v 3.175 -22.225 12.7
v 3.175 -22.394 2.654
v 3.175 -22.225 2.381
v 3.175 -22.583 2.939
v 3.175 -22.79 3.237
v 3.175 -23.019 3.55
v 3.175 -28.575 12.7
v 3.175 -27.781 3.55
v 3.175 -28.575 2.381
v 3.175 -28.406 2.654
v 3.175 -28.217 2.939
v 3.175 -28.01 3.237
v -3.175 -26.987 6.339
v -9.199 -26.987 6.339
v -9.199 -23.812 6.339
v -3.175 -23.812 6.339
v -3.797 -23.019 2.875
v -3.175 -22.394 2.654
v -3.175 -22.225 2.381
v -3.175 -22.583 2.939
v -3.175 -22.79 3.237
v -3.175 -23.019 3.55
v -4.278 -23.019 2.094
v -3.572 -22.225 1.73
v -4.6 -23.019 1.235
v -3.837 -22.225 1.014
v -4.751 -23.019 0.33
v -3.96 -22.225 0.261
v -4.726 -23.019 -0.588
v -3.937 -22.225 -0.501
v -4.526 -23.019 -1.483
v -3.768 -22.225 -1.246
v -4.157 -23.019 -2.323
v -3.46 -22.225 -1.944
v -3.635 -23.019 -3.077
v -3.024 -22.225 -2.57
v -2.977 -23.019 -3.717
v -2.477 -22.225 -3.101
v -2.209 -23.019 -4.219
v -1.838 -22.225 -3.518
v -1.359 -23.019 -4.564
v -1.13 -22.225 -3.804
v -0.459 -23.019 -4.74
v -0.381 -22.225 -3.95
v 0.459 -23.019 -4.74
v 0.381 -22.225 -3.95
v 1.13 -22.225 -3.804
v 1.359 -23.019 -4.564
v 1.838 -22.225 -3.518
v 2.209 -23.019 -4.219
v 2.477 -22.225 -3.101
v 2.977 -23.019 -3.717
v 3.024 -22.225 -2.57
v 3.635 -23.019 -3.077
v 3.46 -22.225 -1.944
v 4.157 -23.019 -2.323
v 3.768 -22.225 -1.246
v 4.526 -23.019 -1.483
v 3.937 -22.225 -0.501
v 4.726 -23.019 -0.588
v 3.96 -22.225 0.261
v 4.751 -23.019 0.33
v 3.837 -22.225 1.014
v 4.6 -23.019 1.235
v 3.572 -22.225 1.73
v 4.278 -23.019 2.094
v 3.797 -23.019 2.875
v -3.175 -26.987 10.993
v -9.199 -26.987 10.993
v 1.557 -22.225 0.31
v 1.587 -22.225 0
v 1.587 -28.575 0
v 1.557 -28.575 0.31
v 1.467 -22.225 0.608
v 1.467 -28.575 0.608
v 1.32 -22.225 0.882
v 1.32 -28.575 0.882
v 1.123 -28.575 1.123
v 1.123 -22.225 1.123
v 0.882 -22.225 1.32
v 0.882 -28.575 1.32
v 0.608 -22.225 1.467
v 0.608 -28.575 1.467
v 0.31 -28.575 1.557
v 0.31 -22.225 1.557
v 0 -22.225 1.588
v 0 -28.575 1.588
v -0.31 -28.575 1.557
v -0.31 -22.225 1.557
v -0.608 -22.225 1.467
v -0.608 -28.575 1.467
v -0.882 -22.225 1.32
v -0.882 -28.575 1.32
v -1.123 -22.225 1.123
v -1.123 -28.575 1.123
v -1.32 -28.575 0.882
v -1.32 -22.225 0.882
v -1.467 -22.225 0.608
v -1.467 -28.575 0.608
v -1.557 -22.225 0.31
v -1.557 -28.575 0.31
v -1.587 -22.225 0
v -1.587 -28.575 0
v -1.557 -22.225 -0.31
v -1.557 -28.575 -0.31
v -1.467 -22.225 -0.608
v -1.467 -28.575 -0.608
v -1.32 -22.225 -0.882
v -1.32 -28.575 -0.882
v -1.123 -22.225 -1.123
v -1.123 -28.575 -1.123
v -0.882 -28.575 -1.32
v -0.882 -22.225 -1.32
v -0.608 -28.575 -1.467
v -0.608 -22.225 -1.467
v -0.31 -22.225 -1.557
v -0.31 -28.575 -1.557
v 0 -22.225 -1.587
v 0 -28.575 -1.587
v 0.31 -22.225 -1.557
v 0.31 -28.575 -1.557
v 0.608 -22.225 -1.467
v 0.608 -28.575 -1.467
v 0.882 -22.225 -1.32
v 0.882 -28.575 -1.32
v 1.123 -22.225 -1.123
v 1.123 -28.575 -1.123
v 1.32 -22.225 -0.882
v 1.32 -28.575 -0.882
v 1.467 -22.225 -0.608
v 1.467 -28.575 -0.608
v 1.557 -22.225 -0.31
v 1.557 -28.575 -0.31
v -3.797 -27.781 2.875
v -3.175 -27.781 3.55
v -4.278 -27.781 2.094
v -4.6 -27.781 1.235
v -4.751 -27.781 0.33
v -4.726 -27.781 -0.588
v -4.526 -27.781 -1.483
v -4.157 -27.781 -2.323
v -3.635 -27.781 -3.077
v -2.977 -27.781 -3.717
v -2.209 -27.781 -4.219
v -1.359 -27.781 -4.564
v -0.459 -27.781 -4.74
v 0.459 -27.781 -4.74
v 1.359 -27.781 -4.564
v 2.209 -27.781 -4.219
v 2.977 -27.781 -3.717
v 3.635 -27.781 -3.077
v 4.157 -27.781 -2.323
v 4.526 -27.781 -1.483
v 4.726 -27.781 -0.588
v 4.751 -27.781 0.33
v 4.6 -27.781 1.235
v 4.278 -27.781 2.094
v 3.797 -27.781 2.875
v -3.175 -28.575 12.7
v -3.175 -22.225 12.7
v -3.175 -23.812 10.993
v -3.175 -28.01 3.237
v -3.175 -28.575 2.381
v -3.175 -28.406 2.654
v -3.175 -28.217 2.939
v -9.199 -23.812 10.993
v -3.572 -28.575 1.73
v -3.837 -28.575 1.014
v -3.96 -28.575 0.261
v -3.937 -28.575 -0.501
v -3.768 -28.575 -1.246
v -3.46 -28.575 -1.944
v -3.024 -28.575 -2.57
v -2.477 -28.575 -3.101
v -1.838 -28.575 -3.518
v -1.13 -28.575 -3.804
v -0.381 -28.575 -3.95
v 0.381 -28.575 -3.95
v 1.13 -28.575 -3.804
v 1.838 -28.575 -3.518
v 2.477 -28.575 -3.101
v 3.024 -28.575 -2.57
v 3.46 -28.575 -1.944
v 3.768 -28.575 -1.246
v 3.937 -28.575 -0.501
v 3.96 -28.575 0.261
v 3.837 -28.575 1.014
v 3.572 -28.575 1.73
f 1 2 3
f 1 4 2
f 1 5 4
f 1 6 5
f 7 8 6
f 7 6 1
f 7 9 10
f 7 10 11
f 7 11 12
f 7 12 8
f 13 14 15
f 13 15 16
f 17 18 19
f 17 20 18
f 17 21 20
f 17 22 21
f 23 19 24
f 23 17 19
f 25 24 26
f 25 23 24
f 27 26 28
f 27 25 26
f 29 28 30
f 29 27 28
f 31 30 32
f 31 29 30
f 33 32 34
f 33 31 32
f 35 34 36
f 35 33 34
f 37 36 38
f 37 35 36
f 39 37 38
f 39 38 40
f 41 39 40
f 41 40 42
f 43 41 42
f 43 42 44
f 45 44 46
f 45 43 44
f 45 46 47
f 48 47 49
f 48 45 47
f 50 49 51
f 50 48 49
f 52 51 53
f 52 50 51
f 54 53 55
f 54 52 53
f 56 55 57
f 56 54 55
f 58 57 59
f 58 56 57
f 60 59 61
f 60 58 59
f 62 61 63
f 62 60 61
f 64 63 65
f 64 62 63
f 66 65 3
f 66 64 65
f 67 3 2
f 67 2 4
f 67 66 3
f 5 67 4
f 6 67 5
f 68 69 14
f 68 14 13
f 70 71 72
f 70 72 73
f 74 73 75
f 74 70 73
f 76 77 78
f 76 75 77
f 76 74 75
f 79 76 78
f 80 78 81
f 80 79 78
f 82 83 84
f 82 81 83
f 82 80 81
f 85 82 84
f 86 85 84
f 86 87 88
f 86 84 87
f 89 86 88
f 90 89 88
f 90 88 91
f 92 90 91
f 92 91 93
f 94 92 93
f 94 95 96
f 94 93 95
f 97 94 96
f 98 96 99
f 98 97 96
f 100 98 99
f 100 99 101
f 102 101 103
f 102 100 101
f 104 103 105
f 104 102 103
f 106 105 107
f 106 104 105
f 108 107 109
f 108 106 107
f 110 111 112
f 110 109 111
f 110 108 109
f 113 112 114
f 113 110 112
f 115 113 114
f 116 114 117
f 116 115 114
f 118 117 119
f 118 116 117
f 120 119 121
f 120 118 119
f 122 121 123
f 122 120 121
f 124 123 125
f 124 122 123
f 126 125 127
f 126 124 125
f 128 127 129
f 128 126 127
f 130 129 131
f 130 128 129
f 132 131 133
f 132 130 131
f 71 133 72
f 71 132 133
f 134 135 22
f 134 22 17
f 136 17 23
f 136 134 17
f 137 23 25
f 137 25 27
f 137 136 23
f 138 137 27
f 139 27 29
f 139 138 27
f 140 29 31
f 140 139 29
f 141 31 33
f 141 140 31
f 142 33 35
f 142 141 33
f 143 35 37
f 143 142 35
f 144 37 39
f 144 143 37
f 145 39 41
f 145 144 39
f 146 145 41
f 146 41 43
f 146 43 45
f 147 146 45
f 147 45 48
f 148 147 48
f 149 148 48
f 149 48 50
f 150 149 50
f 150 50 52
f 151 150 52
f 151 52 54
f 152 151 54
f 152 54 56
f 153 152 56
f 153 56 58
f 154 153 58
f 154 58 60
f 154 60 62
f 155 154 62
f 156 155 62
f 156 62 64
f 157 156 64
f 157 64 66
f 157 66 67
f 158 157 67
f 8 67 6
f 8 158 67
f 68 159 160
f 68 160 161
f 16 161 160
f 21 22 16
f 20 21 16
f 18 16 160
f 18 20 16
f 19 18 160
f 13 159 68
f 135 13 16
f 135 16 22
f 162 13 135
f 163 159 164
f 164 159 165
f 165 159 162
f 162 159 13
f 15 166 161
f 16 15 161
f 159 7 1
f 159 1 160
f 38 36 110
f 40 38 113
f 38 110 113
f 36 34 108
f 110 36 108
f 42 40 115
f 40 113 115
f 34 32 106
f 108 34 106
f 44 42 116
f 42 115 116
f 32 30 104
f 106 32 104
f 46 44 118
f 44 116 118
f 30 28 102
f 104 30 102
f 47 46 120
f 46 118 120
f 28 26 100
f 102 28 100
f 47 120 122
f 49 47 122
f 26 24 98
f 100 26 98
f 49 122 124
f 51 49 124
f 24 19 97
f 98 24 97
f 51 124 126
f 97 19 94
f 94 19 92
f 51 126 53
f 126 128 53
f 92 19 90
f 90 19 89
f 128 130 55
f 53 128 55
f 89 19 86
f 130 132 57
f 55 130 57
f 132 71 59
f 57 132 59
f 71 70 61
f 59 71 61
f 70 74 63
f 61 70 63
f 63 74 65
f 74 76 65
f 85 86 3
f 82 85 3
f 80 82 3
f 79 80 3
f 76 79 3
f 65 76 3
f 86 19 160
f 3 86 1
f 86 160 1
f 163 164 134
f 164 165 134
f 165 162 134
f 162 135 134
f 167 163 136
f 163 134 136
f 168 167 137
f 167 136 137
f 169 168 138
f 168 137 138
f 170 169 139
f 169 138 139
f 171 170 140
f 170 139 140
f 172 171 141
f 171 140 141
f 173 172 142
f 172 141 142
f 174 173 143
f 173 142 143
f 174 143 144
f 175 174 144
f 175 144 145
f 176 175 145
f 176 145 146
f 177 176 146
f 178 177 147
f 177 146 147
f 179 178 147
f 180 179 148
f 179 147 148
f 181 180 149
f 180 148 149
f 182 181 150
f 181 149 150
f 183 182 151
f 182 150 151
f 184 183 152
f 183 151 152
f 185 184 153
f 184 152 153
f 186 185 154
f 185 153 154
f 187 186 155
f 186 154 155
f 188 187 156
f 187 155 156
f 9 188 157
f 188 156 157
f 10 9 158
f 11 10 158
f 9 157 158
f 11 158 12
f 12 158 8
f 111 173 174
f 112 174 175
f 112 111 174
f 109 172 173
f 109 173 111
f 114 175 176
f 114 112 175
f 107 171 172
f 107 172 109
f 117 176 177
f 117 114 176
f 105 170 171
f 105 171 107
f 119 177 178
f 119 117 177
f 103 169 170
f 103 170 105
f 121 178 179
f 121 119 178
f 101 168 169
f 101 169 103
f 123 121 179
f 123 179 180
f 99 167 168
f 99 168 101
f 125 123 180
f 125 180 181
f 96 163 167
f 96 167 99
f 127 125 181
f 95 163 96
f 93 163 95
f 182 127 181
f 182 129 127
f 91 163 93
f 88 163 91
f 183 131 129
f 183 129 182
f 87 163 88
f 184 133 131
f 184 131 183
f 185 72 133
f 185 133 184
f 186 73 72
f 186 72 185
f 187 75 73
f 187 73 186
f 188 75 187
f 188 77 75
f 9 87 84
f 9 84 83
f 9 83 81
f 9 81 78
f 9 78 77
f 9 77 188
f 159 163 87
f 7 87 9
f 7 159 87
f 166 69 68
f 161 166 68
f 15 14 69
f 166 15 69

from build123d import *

# Parameters (mm, degrees)
F2_R     = 4.7625
F2_R_2   = 1.5875
F5_DEPTH = 3.175
F6_DEPTH = 3.175
F4_W     = 7.239
F4_H     = 4.654424265
F7_DEPTH = 1.5875
F8_SIZE  = 0.79375


with BuildPart() as f5:
    # F2 (on offset) → F5 (new body, symmetric)
    with BuildSketch(Plane.XZ.offset(25.4)):
        Circle(F2_R)
        Circle(F2_R_2, mode=Mode.SUBTRACT)
    extrude(amount=F5_DEPTH, both=True)

    # F3 (on offset) → F6 (join, symmetric)
    with BuildSketch(Plane.XZ.offset(25.4)):
        with BuildLine():
            Line((3.175, 0), (3.175, 12.7))
            Line((3.175, 12.7), (-3.175, 12.7))
            Line((-3.175, 12.7), (-3.175, 0))
            Line((-3.175, 0), (-1.5875, 0))
            ThreePointArc((-1.5875, 0), (0, 1.5875), (1.5875, 0))
            Line((1.5875, 0), (3.175, 0))
        make_face()
    extrude(amount=F6_DEPTH, both=True)

    # F4 (on offset) → F7 (join, symmetric)
    with BuildSketch(Plane.XZ.offset(25.4)):
        with Locations((-5.5793230124, 8.6660822853)):
            Rectangle(F4_W, F4_H)
    extrude(amount=F7_DEPTH, both=True)

    # F8
    f8_edges = [f5.edges().sort_by_distance(p)[0] for p in [
        (0, -28.575, -4.7625),
        (0, -22.225, -4.7625),
    ]]
    chamfer(f8_edges, length=F8_SIZE)


solid = f5.part
